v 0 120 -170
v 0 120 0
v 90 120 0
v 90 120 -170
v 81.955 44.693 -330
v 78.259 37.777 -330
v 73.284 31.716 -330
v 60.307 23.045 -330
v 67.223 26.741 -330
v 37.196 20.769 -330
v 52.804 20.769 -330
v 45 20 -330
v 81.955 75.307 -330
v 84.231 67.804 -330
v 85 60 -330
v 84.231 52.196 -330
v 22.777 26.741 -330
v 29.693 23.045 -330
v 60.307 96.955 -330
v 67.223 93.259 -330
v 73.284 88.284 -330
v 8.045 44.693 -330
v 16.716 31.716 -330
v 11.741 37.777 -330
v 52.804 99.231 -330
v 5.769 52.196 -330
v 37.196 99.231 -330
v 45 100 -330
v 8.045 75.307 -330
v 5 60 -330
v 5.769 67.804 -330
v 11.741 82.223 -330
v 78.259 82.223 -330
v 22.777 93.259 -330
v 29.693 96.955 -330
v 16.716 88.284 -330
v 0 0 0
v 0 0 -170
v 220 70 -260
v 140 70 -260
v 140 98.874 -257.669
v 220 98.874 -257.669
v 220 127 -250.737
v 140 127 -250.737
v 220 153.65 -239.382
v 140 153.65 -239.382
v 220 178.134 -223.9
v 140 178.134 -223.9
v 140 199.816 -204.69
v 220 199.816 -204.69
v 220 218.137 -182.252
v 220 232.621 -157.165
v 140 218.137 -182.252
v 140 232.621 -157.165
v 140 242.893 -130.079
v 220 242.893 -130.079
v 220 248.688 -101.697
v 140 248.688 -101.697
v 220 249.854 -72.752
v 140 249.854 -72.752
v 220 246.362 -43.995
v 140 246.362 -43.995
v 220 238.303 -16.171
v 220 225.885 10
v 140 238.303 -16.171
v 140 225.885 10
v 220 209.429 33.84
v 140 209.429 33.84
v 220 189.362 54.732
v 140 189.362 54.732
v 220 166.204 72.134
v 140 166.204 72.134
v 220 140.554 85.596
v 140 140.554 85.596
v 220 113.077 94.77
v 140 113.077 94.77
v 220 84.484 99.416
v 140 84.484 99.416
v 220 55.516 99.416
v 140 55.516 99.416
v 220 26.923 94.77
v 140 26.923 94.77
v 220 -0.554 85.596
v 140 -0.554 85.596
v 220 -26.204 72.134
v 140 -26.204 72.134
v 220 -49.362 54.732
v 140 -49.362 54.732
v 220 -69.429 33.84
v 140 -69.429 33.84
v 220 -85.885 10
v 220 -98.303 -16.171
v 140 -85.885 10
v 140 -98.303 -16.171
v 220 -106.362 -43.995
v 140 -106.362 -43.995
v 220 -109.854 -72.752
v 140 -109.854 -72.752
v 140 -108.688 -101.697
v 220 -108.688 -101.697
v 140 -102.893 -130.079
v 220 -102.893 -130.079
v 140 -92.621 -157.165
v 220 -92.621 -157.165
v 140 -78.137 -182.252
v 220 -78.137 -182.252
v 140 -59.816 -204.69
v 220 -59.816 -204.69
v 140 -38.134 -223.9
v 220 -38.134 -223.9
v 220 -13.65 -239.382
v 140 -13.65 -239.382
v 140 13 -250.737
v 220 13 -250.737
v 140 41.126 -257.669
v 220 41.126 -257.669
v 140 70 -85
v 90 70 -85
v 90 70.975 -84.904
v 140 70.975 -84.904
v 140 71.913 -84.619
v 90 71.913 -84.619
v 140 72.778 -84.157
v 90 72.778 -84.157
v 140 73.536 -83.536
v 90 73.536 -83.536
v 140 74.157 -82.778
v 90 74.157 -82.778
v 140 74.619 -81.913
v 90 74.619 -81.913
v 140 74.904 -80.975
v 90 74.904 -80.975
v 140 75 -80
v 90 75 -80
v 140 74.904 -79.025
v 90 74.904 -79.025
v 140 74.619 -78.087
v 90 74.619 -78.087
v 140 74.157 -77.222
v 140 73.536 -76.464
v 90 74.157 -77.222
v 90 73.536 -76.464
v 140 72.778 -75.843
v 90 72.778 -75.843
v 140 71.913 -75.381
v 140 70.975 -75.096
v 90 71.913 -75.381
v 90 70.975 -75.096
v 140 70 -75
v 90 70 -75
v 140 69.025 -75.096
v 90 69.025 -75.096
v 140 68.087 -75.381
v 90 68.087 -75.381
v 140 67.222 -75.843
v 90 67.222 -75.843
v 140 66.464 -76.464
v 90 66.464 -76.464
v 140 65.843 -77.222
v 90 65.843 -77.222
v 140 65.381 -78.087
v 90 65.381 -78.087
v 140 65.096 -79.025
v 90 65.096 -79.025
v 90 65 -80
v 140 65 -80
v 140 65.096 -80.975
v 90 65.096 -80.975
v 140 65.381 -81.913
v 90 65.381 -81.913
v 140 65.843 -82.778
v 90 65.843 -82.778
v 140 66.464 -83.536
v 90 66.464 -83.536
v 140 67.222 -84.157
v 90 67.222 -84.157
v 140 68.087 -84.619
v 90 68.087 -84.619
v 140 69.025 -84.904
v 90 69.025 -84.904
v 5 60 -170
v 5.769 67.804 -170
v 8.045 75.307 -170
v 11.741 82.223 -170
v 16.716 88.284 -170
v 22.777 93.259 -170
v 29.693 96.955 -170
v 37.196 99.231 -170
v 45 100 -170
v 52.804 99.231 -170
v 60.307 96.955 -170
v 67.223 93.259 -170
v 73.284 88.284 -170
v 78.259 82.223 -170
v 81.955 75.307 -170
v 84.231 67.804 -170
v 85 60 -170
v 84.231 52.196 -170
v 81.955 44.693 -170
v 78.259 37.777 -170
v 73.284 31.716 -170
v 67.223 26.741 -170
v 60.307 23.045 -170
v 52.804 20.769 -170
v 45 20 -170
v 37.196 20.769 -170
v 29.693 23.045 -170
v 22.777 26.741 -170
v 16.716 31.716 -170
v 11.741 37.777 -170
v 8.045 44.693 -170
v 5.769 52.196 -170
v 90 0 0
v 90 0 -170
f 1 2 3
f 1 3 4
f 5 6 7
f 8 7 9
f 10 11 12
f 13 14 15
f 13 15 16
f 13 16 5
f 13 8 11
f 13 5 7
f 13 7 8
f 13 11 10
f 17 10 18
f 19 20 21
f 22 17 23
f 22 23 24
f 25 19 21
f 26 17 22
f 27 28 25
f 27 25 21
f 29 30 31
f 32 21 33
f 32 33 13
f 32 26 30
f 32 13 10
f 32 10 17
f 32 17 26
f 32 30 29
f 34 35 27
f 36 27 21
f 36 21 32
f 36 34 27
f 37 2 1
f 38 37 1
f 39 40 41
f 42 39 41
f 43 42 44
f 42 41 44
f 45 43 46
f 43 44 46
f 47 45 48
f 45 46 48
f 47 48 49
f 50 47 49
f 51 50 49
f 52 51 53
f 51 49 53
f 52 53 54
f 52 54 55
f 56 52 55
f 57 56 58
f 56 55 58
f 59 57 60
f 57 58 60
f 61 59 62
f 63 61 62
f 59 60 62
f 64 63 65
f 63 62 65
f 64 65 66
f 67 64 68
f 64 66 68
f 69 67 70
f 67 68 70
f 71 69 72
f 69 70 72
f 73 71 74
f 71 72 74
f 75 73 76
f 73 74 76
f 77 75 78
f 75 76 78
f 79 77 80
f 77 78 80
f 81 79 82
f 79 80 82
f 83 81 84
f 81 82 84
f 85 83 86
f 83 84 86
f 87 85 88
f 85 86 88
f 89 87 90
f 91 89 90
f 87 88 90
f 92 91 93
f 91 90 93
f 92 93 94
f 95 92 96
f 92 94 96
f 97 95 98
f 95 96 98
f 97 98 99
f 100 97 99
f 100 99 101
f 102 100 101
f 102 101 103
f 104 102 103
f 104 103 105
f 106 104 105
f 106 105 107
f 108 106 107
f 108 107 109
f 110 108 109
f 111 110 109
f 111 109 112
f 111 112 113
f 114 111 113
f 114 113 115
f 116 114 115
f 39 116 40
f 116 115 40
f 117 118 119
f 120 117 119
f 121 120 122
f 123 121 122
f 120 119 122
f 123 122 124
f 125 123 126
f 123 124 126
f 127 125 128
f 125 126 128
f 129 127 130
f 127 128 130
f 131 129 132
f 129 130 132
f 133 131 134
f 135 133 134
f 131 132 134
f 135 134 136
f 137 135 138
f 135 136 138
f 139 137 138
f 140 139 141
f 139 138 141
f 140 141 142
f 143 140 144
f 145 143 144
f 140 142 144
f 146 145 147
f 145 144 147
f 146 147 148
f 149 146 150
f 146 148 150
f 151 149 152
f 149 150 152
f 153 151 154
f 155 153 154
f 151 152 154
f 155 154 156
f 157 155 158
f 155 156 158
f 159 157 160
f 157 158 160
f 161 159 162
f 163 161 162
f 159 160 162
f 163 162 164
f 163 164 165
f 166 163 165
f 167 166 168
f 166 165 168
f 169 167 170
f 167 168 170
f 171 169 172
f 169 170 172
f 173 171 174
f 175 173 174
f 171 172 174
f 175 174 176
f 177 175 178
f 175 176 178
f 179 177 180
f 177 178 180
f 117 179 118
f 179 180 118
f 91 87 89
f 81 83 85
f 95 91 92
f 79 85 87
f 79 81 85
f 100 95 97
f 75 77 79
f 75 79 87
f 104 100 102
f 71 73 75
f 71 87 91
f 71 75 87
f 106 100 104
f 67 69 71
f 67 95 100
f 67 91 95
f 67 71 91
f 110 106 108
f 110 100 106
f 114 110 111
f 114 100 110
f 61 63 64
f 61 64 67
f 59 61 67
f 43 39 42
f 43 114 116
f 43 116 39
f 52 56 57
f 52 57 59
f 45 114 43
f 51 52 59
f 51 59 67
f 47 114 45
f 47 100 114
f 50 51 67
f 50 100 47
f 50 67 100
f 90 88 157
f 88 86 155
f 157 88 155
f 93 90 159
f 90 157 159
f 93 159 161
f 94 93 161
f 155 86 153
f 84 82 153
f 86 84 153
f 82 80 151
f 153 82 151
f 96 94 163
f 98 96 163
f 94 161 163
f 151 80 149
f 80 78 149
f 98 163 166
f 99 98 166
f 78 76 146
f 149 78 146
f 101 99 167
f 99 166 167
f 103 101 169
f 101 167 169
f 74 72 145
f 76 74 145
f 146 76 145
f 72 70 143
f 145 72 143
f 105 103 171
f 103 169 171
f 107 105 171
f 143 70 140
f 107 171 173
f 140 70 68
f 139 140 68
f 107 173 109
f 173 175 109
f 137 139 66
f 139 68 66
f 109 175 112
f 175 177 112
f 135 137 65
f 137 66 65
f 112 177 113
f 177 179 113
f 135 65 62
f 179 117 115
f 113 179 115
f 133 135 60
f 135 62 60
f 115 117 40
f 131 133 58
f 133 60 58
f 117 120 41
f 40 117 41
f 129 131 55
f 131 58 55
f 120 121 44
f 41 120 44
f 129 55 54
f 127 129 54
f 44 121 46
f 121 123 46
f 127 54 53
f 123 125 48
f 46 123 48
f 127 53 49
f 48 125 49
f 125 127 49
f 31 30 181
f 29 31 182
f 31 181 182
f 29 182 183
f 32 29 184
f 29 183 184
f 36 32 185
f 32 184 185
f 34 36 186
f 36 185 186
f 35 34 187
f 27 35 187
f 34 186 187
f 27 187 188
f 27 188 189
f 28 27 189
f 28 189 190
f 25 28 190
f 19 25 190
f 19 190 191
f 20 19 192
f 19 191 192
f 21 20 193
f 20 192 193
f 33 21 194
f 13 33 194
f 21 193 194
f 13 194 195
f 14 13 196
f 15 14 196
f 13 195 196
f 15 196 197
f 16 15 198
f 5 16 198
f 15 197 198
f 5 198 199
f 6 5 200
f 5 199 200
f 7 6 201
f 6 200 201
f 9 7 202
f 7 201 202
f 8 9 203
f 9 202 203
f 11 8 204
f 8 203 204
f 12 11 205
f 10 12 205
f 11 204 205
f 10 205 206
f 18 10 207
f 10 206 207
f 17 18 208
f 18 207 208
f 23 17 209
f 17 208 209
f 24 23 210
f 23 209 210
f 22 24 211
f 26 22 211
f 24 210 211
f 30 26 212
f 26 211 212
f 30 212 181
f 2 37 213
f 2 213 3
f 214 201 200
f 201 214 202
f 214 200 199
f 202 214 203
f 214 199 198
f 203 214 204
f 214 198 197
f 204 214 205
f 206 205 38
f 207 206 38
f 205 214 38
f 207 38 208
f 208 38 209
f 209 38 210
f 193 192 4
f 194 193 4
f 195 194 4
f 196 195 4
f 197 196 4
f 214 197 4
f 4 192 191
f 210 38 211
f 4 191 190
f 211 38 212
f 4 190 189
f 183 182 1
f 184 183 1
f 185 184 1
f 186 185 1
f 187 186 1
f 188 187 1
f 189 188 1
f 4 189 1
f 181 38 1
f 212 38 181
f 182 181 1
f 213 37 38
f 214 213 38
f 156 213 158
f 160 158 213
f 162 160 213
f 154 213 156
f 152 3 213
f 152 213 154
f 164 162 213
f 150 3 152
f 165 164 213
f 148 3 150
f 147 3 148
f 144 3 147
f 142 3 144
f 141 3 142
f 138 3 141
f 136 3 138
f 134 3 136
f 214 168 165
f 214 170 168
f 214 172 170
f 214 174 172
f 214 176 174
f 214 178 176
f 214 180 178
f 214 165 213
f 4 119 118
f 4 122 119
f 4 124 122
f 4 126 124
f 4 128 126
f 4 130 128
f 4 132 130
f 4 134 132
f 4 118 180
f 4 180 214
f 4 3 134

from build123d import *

# Parameters (mm, degrees)
SKETCH1_W           = 170
SKETCH1_H           = 120
BOSS_EXTRUDE1_DEPTH = 90
SKETCH5_R           = 40
BOSS_EXTRUDE3_DEPTH = 160
SKETCH7_R           = 5
BOSS_EXTRUDE4_DEPTH = 50
SKETCH8_R           = 180
BOSS_EXTRUDE5_DEPTH = 80


with BuildPart() as part:
    # Sketch1 → Boss-Extrude1 (new body)
    with BuildSketch(Plane(origin=(0, 0, 0), x_dir=(0, 0, -1), z_dir=(1, 0, 0))):
        with Locations((85, 60)):
            Rectangle(SKETCH1_W, SKETCH1_H)
    extrude(amount=BOSS_EXTRUDE1_DEPTH)

    # Sketch5 → Boss-Extrude3 (add)
    with BuildSketch(Plane(origin=(0, 0, -170), x_dir=(-1, 0, 0), z_dir=(0, 0, -1))):
        with Locations((-45, 60)):
            Circle(SKETCH5_R)
    extrude(amount=BOSS_EXTRUDE3_DEPTH)

    # Sketch7 → Boss-Extrude4 (add)
    with BuildSketch(Plane(origin=(90, 0, 0), x_dir=(0, 0, -1), z_dir=(1, 0, 0))):
        with Locations((80, 70)):
            Circle(SKETCH7_R)
    extrude(amount=BOSS_EXTRUDE4_DEPTH)

    # Sketch8 → Boss-Extrude5 (add)
    with BuildSketch(Plane(origin=(140, 0, 0), x_dir=(0, 0, -1), z_dir=(1, 0, 0))):
        with Locations((80, 70)):
            Circle(SKETCH8_R)
    extrude(amount=BOSS_EXTRUDE5_DEPTH)


solid = part.part
